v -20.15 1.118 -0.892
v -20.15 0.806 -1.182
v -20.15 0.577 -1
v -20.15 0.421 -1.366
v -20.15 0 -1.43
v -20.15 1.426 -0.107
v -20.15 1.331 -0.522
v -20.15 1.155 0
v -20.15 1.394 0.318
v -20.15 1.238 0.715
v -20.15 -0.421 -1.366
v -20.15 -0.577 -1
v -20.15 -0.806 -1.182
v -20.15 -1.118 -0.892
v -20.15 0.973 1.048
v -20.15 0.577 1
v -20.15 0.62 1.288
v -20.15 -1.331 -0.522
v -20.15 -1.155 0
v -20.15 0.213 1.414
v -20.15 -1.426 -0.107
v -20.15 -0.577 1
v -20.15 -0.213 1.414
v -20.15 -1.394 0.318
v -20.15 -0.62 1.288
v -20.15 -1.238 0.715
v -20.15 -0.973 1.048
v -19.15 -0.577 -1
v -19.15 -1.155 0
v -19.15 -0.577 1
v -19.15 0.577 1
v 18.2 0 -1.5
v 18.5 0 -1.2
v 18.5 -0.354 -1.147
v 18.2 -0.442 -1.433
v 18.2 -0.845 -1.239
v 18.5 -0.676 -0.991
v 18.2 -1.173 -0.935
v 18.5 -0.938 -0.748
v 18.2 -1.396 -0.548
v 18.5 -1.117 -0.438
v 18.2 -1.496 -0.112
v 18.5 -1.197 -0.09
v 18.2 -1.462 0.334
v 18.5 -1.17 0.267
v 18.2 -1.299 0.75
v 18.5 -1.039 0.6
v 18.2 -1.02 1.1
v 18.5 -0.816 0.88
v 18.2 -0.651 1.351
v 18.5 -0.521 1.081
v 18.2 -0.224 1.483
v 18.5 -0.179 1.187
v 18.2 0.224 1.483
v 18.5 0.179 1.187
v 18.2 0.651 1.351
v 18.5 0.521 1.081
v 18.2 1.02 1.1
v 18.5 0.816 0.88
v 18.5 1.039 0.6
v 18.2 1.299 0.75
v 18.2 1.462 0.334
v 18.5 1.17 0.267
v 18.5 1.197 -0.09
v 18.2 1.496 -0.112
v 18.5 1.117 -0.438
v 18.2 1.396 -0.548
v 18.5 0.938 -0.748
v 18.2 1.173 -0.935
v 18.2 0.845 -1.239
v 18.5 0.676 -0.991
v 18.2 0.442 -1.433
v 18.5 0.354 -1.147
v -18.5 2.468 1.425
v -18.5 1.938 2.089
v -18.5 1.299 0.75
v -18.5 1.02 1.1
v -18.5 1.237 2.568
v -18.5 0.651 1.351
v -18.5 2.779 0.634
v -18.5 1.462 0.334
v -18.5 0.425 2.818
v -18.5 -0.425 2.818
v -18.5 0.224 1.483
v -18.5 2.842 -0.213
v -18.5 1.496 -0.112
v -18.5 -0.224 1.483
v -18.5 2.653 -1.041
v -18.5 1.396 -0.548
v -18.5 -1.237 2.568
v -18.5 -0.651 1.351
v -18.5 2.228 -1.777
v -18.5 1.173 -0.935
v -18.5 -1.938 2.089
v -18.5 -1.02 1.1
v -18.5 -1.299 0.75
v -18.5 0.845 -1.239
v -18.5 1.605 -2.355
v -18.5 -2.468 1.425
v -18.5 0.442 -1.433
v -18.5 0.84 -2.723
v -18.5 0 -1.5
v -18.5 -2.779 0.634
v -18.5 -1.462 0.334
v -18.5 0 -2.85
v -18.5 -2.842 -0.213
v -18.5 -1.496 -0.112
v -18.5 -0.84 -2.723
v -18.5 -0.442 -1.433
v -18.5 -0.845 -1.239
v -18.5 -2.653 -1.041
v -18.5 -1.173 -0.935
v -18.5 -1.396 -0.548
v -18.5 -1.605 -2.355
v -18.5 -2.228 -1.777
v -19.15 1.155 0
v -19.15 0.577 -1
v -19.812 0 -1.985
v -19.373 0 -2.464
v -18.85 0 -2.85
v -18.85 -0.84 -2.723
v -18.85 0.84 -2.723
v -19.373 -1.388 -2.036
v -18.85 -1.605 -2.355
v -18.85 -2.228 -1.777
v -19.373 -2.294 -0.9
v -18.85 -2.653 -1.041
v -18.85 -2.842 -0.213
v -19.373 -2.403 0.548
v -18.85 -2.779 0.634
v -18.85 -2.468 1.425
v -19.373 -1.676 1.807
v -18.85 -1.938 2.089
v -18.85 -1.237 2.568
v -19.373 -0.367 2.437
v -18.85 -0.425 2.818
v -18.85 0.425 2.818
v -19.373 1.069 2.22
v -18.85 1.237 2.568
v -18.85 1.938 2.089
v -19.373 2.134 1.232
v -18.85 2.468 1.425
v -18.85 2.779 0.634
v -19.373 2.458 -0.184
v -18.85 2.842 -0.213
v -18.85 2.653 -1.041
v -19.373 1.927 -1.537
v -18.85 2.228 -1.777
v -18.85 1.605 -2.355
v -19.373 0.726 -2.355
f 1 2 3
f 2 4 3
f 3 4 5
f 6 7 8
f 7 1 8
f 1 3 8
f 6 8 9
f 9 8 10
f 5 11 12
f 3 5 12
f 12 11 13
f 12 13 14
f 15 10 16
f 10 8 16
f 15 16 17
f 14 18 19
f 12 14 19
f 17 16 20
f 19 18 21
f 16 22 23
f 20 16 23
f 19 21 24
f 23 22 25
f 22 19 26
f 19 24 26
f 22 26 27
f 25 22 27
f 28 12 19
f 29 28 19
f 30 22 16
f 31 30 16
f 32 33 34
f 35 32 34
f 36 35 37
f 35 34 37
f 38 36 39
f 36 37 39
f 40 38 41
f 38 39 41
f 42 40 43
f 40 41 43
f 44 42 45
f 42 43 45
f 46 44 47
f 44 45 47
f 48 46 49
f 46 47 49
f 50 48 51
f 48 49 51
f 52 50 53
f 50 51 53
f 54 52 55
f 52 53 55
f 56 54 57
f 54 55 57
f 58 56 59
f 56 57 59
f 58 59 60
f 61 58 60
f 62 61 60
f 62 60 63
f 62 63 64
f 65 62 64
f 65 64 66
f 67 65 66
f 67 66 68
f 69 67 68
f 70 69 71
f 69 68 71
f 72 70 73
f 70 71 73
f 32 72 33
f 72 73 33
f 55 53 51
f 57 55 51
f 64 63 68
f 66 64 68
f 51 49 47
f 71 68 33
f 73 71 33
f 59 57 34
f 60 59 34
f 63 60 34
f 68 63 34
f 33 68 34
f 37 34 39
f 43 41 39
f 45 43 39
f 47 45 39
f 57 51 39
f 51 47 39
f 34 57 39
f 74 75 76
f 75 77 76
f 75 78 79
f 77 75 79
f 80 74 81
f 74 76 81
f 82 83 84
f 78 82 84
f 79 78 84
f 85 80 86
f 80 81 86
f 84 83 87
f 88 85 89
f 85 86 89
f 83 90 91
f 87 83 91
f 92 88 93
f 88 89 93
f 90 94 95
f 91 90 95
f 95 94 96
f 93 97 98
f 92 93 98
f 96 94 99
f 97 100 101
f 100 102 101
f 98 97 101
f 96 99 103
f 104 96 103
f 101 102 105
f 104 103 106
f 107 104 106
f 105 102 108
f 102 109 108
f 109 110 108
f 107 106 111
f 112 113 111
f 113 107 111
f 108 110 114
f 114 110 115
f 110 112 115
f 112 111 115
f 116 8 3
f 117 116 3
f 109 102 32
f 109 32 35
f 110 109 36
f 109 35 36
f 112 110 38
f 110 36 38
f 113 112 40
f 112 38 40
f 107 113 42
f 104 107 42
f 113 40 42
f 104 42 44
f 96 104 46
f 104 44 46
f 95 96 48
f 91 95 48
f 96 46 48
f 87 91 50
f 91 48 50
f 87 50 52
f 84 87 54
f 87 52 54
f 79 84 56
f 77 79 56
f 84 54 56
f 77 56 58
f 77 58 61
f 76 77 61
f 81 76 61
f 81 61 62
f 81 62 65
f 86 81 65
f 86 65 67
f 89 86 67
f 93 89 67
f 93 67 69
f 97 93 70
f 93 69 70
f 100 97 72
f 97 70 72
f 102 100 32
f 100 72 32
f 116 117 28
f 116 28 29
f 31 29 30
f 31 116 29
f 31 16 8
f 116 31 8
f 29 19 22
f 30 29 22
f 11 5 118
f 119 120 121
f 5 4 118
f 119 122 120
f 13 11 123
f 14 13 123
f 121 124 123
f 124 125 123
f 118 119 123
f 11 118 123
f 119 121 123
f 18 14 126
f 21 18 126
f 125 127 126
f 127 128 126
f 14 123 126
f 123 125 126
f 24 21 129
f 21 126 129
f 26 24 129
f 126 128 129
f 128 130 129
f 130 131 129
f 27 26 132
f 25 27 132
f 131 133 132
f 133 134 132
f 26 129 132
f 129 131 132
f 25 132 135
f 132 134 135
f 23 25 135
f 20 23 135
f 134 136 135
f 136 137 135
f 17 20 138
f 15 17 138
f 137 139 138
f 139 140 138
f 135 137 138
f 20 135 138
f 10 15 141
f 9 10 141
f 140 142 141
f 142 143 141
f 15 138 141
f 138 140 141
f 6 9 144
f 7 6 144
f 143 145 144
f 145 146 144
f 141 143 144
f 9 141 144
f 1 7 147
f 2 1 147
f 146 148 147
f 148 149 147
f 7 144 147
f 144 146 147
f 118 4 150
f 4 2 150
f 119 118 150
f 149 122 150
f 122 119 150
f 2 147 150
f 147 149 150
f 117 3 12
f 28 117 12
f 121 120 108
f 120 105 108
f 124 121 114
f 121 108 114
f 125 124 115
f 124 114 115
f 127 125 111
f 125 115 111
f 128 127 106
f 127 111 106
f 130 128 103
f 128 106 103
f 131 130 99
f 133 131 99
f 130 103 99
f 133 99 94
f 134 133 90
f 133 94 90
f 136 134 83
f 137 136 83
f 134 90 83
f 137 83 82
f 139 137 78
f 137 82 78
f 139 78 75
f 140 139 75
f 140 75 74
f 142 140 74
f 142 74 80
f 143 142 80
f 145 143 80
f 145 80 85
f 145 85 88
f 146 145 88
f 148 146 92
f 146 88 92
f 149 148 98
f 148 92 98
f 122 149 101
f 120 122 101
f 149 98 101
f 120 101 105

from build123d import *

# Parameters (mm, degrees)
CHAMFER1_SIZE      = 0.3
CUT_EXTRUDE1_DEPTH = 1


with BuildPart() as part:
    # Sketch2 → Revolve2 (revolve)
    with BuildSketch(Plane.XY, mode=Mode.PRIVATE) as revolve2_sk:
        with BuildLine():
            Line((18.5, 0), (-18.5, 0))
            Line((-18.5, 0), (-20.15, 0))
            Line((-20.15, 0), (-20.15, 1.43))
            ThreePointArc((-20.15, 1.43), (-19.604204204, 2.235398215), (-18.85, 2.85))
            Line((-18.85, 2.85), (-18.5, 2.85))
            Line((-18.5, 2.85), (-18.5, 1.5))
            Line((-18.5, 1.5), (18.5, 1.5))
            Line((18.5, 1.5), (18.5, 0))
        make_face()
    revolve(revolve2_sk.sketch.rotate(Axis((18.5, 0, 0), (-1, 0, 0)), 90), axis=Axis((18.5, 0, 0), (-1, 0, 0)))

    # Chamfer1
    chamfer1_edges = [part.edges().sort_by_distance(p)[0] for p in [
        (18.5, 0, 1.5),
    ]]
    chamfer(chamfer1_edges, length=CHAMFER1_SIZE)

    # Sketch3 → Cut-Extrude1 (cut)
    with BuildSketch(Plane.ZY.offset(20.15)):
        Polygon((-1, 0.577350269), (-1, -0.577350269), (0, -1.154700538), (1, -0.577350269), (1, 0.577350269), (0, 1.154700538), align=None)
    extrude(amount=-CUT_EXTRUDE1_DEPTH, mode=Mode.SUBTRACT)


solid = part.part
